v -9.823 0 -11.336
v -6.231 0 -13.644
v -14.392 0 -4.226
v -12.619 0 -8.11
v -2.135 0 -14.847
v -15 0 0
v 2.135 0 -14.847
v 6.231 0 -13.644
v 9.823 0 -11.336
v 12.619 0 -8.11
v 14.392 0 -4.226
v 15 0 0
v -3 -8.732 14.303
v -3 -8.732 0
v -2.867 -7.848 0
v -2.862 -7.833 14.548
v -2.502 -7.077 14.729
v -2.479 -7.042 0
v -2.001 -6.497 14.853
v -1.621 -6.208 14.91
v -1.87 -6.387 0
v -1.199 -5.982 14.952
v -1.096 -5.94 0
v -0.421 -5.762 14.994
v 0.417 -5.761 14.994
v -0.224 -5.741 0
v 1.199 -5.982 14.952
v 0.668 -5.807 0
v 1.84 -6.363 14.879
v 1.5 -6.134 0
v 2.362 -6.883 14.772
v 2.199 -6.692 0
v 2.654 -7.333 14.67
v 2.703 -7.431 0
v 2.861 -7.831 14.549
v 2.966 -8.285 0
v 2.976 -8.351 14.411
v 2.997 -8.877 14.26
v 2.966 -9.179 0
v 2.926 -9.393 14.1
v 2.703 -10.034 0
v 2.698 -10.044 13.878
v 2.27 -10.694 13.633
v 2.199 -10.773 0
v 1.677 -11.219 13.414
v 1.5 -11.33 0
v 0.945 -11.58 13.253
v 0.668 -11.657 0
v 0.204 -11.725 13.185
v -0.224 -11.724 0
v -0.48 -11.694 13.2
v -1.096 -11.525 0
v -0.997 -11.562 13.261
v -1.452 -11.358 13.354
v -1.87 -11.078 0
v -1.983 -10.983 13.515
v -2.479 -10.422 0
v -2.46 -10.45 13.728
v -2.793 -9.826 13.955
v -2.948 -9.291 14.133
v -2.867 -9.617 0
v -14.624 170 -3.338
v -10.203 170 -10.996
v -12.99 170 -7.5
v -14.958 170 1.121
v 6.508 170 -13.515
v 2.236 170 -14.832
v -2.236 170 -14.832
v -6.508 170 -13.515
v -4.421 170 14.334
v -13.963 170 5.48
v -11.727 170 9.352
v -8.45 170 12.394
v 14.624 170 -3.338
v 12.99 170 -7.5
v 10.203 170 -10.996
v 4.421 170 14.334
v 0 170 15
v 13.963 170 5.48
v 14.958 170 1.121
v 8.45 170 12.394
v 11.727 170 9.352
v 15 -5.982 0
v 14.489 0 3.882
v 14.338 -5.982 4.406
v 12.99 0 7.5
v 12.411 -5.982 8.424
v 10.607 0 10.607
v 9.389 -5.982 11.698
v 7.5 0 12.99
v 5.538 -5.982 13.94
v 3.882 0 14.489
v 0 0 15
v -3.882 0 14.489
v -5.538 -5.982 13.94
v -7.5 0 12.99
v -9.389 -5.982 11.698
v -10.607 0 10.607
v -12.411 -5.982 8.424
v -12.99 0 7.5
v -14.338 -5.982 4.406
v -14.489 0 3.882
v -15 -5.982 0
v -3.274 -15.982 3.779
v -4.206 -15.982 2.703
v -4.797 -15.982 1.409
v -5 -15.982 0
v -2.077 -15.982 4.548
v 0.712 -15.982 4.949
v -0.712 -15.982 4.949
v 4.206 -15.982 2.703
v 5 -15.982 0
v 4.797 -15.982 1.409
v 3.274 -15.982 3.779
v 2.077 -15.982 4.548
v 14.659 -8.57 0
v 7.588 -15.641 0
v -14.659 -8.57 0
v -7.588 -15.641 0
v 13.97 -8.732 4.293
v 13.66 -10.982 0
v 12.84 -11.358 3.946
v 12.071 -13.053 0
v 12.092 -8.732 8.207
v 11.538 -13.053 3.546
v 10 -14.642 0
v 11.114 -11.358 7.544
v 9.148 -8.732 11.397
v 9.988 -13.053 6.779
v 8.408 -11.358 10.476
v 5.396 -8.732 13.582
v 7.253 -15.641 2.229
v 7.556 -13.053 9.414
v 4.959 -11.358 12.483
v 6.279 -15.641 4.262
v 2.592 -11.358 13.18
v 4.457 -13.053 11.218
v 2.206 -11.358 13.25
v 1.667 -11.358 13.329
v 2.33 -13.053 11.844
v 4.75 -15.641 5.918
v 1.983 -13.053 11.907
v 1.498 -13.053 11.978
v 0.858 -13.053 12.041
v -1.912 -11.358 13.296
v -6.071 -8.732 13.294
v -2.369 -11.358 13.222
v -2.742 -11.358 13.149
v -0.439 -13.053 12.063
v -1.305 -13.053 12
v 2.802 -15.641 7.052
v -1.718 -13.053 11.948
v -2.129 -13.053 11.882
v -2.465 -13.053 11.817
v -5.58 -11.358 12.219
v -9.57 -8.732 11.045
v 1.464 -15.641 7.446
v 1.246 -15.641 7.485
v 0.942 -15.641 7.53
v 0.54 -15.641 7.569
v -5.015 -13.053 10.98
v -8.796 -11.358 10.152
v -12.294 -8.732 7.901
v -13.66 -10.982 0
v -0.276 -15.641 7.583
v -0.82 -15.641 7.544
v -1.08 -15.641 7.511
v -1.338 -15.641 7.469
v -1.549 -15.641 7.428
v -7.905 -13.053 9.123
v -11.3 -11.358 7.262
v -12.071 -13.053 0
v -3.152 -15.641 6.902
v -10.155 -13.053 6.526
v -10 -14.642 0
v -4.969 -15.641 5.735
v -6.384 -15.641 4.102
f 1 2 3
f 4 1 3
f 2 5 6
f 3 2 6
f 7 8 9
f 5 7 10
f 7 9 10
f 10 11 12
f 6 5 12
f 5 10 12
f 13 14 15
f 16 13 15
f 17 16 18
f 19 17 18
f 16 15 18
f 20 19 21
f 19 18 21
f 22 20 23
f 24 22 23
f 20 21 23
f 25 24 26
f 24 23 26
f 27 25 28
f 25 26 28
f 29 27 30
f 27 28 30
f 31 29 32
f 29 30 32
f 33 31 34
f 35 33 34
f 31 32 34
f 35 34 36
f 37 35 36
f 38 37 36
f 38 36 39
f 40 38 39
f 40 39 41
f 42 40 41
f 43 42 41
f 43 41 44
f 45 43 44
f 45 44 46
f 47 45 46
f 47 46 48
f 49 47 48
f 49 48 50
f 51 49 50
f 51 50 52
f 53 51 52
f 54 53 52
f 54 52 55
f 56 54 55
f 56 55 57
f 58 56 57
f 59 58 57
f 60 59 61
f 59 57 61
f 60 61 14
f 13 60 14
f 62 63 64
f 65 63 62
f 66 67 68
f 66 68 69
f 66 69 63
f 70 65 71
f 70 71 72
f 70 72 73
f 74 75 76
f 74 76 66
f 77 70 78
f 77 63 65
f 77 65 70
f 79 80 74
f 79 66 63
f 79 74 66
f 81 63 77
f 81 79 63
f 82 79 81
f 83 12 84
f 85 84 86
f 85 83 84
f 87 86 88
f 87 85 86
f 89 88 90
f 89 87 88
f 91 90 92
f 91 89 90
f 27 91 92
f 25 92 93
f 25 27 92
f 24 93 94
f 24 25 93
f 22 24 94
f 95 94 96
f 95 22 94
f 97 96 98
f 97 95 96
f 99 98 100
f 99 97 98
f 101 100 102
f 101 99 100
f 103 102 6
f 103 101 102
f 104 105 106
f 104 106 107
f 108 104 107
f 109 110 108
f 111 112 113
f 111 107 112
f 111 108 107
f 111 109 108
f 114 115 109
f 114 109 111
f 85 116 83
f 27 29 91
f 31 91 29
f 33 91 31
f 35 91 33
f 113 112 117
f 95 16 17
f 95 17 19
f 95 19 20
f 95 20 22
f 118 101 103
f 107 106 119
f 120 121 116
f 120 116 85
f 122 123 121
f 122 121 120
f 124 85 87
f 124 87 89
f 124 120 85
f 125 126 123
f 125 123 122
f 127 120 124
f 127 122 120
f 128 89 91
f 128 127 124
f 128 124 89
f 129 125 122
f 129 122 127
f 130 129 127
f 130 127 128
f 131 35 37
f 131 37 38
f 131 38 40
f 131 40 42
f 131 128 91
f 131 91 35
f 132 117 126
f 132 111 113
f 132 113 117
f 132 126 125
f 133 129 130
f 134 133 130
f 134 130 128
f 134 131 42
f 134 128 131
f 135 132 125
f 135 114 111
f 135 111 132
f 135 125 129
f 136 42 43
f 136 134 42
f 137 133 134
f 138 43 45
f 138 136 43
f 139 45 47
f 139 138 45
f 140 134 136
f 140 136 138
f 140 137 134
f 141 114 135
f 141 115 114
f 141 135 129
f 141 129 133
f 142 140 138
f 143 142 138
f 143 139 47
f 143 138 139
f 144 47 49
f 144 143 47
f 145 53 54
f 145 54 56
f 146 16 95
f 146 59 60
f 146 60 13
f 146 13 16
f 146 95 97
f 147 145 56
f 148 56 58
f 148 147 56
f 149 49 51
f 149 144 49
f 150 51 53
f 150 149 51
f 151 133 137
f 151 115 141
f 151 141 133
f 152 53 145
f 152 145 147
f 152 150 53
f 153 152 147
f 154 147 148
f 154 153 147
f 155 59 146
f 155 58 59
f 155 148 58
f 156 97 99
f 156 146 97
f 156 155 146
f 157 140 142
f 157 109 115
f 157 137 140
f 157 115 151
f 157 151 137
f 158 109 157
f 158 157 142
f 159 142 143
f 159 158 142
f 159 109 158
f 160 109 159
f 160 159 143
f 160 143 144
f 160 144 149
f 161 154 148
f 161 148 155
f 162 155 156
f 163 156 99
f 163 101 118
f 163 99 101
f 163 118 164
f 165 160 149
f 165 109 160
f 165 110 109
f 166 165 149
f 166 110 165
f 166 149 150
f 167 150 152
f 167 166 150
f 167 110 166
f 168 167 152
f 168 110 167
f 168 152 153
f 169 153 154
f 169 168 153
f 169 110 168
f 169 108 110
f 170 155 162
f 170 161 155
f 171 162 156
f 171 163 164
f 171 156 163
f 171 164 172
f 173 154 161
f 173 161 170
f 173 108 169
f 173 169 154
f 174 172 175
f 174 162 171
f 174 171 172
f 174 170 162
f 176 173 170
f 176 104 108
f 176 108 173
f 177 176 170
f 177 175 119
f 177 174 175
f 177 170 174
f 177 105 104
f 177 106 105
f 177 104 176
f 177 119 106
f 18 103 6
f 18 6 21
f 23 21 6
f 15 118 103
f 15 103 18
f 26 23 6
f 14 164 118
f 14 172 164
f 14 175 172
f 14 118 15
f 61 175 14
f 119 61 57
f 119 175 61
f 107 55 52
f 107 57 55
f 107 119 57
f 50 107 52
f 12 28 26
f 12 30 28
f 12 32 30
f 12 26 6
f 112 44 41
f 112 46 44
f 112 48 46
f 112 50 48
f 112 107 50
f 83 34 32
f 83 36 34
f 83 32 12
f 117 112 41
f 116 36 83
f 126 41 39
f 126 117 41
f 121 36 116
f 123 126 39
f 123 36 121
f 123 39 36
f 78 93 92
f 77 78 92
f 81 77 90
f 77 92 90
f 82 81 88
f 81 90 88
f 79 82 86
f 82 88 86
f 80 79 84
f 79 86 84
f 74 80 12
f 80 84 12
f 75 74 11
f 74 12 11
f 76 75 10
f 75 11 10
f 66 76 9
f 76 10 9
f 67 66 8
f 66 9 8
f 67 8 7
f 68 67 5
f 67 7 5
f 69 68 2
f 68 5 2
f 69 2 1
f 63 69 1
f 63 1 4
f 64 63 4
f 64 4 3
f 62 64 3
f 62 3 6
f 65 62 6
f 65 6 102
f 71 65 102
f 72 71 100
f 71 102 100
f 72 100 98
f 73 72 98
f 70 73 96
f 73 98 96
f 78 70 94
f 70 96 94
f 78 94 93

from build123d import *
from build123d.topology import SkipClean

# Parameters (mm, degrees)
SKETCH2_R           = 15
BOSS_EXTRUDE1_DEPTH = 170
BOSS_EXTRUDE2_START = 15.982197964
BOSS_EXTRUDE2_DEPTH = 15.982197964
SKETCH5_R           = 3
CUT_EXTRUDE1_DEPTH  = 19
FILLET5_R           = 10


with BuildPart() as part:
    # Sketch2 → Boss-Extrude1 (new body)
    with BuildSketch(Plane(origin=(0, 0, 0), x_dir=(1, 0, 0), z_dir=(0, 1, 0))):
        with Locations(Location((0, 0, 0), (0, 0, 270))):
            Circle(SKETCH2_R)
    extrude(amount=BOSS_EXTRUDE1_DEPTH)

    # Sketch3 → Boss-Extrude2 (add)
    with SkipClean():  # the faces are left unmerged after this step: merging them gives an invalid solid
        with BuildSketch(Plane.XZ.offset(BOSS_EXTRUDE2_START)):
            with BuildLine():
                Line((-15, 0), (15, 0))
                ThreePointArc((15, 0), (0, 15), (-15, 0))
            make_face()
        extrude(amount=-BOSS_EXTRUDE2_DEPTH)

    # Sketch5 → Cut-Extrude1 (cut)
    with SkipClean():  # the faces are left unmerged after this step: merging them gives an invalid solid
        with BuildSketch(Plane(origin=(0, 0, 0), x_dir=(-1, 0, 0), z_dir=(0, 0, -1))):
            with Locations((0, -8.732260388)):
                Circle(SKETCH5_R)
        extrude(amount=-CUT_EXTRUDE1_DEPTH, mode=Mode.SUBTRACT)

    # Fillet5
    # the kernel refuses this fillet: 10 mm, written as the material it takes off along each edge
    with BuildSketch(Plane(origin=(0, -15.982197964, 0), x_dir=(0.0031415874858799616, 0, -0.9999950652018581), z_dir=(-0.9999950652018581, 0, -0.0031415874858799616))) as fillet5_piece_1:
        with BuildLine():
            CenterArc((15 - FILLET5_R, -FILLET5_R), FILLET5_R, 0, 90)
            Line((15 - FILLET5_R, 0), (15, 0))
            Line((15, 0), (15, -FILLET5_R))
        make_face()
    revolve(axis=Axis((0, -15.982197964, 0), (0, -1, 0)), revolution_arc=359.64, mode=Mode.SUBTRACT)


solid = part.part
